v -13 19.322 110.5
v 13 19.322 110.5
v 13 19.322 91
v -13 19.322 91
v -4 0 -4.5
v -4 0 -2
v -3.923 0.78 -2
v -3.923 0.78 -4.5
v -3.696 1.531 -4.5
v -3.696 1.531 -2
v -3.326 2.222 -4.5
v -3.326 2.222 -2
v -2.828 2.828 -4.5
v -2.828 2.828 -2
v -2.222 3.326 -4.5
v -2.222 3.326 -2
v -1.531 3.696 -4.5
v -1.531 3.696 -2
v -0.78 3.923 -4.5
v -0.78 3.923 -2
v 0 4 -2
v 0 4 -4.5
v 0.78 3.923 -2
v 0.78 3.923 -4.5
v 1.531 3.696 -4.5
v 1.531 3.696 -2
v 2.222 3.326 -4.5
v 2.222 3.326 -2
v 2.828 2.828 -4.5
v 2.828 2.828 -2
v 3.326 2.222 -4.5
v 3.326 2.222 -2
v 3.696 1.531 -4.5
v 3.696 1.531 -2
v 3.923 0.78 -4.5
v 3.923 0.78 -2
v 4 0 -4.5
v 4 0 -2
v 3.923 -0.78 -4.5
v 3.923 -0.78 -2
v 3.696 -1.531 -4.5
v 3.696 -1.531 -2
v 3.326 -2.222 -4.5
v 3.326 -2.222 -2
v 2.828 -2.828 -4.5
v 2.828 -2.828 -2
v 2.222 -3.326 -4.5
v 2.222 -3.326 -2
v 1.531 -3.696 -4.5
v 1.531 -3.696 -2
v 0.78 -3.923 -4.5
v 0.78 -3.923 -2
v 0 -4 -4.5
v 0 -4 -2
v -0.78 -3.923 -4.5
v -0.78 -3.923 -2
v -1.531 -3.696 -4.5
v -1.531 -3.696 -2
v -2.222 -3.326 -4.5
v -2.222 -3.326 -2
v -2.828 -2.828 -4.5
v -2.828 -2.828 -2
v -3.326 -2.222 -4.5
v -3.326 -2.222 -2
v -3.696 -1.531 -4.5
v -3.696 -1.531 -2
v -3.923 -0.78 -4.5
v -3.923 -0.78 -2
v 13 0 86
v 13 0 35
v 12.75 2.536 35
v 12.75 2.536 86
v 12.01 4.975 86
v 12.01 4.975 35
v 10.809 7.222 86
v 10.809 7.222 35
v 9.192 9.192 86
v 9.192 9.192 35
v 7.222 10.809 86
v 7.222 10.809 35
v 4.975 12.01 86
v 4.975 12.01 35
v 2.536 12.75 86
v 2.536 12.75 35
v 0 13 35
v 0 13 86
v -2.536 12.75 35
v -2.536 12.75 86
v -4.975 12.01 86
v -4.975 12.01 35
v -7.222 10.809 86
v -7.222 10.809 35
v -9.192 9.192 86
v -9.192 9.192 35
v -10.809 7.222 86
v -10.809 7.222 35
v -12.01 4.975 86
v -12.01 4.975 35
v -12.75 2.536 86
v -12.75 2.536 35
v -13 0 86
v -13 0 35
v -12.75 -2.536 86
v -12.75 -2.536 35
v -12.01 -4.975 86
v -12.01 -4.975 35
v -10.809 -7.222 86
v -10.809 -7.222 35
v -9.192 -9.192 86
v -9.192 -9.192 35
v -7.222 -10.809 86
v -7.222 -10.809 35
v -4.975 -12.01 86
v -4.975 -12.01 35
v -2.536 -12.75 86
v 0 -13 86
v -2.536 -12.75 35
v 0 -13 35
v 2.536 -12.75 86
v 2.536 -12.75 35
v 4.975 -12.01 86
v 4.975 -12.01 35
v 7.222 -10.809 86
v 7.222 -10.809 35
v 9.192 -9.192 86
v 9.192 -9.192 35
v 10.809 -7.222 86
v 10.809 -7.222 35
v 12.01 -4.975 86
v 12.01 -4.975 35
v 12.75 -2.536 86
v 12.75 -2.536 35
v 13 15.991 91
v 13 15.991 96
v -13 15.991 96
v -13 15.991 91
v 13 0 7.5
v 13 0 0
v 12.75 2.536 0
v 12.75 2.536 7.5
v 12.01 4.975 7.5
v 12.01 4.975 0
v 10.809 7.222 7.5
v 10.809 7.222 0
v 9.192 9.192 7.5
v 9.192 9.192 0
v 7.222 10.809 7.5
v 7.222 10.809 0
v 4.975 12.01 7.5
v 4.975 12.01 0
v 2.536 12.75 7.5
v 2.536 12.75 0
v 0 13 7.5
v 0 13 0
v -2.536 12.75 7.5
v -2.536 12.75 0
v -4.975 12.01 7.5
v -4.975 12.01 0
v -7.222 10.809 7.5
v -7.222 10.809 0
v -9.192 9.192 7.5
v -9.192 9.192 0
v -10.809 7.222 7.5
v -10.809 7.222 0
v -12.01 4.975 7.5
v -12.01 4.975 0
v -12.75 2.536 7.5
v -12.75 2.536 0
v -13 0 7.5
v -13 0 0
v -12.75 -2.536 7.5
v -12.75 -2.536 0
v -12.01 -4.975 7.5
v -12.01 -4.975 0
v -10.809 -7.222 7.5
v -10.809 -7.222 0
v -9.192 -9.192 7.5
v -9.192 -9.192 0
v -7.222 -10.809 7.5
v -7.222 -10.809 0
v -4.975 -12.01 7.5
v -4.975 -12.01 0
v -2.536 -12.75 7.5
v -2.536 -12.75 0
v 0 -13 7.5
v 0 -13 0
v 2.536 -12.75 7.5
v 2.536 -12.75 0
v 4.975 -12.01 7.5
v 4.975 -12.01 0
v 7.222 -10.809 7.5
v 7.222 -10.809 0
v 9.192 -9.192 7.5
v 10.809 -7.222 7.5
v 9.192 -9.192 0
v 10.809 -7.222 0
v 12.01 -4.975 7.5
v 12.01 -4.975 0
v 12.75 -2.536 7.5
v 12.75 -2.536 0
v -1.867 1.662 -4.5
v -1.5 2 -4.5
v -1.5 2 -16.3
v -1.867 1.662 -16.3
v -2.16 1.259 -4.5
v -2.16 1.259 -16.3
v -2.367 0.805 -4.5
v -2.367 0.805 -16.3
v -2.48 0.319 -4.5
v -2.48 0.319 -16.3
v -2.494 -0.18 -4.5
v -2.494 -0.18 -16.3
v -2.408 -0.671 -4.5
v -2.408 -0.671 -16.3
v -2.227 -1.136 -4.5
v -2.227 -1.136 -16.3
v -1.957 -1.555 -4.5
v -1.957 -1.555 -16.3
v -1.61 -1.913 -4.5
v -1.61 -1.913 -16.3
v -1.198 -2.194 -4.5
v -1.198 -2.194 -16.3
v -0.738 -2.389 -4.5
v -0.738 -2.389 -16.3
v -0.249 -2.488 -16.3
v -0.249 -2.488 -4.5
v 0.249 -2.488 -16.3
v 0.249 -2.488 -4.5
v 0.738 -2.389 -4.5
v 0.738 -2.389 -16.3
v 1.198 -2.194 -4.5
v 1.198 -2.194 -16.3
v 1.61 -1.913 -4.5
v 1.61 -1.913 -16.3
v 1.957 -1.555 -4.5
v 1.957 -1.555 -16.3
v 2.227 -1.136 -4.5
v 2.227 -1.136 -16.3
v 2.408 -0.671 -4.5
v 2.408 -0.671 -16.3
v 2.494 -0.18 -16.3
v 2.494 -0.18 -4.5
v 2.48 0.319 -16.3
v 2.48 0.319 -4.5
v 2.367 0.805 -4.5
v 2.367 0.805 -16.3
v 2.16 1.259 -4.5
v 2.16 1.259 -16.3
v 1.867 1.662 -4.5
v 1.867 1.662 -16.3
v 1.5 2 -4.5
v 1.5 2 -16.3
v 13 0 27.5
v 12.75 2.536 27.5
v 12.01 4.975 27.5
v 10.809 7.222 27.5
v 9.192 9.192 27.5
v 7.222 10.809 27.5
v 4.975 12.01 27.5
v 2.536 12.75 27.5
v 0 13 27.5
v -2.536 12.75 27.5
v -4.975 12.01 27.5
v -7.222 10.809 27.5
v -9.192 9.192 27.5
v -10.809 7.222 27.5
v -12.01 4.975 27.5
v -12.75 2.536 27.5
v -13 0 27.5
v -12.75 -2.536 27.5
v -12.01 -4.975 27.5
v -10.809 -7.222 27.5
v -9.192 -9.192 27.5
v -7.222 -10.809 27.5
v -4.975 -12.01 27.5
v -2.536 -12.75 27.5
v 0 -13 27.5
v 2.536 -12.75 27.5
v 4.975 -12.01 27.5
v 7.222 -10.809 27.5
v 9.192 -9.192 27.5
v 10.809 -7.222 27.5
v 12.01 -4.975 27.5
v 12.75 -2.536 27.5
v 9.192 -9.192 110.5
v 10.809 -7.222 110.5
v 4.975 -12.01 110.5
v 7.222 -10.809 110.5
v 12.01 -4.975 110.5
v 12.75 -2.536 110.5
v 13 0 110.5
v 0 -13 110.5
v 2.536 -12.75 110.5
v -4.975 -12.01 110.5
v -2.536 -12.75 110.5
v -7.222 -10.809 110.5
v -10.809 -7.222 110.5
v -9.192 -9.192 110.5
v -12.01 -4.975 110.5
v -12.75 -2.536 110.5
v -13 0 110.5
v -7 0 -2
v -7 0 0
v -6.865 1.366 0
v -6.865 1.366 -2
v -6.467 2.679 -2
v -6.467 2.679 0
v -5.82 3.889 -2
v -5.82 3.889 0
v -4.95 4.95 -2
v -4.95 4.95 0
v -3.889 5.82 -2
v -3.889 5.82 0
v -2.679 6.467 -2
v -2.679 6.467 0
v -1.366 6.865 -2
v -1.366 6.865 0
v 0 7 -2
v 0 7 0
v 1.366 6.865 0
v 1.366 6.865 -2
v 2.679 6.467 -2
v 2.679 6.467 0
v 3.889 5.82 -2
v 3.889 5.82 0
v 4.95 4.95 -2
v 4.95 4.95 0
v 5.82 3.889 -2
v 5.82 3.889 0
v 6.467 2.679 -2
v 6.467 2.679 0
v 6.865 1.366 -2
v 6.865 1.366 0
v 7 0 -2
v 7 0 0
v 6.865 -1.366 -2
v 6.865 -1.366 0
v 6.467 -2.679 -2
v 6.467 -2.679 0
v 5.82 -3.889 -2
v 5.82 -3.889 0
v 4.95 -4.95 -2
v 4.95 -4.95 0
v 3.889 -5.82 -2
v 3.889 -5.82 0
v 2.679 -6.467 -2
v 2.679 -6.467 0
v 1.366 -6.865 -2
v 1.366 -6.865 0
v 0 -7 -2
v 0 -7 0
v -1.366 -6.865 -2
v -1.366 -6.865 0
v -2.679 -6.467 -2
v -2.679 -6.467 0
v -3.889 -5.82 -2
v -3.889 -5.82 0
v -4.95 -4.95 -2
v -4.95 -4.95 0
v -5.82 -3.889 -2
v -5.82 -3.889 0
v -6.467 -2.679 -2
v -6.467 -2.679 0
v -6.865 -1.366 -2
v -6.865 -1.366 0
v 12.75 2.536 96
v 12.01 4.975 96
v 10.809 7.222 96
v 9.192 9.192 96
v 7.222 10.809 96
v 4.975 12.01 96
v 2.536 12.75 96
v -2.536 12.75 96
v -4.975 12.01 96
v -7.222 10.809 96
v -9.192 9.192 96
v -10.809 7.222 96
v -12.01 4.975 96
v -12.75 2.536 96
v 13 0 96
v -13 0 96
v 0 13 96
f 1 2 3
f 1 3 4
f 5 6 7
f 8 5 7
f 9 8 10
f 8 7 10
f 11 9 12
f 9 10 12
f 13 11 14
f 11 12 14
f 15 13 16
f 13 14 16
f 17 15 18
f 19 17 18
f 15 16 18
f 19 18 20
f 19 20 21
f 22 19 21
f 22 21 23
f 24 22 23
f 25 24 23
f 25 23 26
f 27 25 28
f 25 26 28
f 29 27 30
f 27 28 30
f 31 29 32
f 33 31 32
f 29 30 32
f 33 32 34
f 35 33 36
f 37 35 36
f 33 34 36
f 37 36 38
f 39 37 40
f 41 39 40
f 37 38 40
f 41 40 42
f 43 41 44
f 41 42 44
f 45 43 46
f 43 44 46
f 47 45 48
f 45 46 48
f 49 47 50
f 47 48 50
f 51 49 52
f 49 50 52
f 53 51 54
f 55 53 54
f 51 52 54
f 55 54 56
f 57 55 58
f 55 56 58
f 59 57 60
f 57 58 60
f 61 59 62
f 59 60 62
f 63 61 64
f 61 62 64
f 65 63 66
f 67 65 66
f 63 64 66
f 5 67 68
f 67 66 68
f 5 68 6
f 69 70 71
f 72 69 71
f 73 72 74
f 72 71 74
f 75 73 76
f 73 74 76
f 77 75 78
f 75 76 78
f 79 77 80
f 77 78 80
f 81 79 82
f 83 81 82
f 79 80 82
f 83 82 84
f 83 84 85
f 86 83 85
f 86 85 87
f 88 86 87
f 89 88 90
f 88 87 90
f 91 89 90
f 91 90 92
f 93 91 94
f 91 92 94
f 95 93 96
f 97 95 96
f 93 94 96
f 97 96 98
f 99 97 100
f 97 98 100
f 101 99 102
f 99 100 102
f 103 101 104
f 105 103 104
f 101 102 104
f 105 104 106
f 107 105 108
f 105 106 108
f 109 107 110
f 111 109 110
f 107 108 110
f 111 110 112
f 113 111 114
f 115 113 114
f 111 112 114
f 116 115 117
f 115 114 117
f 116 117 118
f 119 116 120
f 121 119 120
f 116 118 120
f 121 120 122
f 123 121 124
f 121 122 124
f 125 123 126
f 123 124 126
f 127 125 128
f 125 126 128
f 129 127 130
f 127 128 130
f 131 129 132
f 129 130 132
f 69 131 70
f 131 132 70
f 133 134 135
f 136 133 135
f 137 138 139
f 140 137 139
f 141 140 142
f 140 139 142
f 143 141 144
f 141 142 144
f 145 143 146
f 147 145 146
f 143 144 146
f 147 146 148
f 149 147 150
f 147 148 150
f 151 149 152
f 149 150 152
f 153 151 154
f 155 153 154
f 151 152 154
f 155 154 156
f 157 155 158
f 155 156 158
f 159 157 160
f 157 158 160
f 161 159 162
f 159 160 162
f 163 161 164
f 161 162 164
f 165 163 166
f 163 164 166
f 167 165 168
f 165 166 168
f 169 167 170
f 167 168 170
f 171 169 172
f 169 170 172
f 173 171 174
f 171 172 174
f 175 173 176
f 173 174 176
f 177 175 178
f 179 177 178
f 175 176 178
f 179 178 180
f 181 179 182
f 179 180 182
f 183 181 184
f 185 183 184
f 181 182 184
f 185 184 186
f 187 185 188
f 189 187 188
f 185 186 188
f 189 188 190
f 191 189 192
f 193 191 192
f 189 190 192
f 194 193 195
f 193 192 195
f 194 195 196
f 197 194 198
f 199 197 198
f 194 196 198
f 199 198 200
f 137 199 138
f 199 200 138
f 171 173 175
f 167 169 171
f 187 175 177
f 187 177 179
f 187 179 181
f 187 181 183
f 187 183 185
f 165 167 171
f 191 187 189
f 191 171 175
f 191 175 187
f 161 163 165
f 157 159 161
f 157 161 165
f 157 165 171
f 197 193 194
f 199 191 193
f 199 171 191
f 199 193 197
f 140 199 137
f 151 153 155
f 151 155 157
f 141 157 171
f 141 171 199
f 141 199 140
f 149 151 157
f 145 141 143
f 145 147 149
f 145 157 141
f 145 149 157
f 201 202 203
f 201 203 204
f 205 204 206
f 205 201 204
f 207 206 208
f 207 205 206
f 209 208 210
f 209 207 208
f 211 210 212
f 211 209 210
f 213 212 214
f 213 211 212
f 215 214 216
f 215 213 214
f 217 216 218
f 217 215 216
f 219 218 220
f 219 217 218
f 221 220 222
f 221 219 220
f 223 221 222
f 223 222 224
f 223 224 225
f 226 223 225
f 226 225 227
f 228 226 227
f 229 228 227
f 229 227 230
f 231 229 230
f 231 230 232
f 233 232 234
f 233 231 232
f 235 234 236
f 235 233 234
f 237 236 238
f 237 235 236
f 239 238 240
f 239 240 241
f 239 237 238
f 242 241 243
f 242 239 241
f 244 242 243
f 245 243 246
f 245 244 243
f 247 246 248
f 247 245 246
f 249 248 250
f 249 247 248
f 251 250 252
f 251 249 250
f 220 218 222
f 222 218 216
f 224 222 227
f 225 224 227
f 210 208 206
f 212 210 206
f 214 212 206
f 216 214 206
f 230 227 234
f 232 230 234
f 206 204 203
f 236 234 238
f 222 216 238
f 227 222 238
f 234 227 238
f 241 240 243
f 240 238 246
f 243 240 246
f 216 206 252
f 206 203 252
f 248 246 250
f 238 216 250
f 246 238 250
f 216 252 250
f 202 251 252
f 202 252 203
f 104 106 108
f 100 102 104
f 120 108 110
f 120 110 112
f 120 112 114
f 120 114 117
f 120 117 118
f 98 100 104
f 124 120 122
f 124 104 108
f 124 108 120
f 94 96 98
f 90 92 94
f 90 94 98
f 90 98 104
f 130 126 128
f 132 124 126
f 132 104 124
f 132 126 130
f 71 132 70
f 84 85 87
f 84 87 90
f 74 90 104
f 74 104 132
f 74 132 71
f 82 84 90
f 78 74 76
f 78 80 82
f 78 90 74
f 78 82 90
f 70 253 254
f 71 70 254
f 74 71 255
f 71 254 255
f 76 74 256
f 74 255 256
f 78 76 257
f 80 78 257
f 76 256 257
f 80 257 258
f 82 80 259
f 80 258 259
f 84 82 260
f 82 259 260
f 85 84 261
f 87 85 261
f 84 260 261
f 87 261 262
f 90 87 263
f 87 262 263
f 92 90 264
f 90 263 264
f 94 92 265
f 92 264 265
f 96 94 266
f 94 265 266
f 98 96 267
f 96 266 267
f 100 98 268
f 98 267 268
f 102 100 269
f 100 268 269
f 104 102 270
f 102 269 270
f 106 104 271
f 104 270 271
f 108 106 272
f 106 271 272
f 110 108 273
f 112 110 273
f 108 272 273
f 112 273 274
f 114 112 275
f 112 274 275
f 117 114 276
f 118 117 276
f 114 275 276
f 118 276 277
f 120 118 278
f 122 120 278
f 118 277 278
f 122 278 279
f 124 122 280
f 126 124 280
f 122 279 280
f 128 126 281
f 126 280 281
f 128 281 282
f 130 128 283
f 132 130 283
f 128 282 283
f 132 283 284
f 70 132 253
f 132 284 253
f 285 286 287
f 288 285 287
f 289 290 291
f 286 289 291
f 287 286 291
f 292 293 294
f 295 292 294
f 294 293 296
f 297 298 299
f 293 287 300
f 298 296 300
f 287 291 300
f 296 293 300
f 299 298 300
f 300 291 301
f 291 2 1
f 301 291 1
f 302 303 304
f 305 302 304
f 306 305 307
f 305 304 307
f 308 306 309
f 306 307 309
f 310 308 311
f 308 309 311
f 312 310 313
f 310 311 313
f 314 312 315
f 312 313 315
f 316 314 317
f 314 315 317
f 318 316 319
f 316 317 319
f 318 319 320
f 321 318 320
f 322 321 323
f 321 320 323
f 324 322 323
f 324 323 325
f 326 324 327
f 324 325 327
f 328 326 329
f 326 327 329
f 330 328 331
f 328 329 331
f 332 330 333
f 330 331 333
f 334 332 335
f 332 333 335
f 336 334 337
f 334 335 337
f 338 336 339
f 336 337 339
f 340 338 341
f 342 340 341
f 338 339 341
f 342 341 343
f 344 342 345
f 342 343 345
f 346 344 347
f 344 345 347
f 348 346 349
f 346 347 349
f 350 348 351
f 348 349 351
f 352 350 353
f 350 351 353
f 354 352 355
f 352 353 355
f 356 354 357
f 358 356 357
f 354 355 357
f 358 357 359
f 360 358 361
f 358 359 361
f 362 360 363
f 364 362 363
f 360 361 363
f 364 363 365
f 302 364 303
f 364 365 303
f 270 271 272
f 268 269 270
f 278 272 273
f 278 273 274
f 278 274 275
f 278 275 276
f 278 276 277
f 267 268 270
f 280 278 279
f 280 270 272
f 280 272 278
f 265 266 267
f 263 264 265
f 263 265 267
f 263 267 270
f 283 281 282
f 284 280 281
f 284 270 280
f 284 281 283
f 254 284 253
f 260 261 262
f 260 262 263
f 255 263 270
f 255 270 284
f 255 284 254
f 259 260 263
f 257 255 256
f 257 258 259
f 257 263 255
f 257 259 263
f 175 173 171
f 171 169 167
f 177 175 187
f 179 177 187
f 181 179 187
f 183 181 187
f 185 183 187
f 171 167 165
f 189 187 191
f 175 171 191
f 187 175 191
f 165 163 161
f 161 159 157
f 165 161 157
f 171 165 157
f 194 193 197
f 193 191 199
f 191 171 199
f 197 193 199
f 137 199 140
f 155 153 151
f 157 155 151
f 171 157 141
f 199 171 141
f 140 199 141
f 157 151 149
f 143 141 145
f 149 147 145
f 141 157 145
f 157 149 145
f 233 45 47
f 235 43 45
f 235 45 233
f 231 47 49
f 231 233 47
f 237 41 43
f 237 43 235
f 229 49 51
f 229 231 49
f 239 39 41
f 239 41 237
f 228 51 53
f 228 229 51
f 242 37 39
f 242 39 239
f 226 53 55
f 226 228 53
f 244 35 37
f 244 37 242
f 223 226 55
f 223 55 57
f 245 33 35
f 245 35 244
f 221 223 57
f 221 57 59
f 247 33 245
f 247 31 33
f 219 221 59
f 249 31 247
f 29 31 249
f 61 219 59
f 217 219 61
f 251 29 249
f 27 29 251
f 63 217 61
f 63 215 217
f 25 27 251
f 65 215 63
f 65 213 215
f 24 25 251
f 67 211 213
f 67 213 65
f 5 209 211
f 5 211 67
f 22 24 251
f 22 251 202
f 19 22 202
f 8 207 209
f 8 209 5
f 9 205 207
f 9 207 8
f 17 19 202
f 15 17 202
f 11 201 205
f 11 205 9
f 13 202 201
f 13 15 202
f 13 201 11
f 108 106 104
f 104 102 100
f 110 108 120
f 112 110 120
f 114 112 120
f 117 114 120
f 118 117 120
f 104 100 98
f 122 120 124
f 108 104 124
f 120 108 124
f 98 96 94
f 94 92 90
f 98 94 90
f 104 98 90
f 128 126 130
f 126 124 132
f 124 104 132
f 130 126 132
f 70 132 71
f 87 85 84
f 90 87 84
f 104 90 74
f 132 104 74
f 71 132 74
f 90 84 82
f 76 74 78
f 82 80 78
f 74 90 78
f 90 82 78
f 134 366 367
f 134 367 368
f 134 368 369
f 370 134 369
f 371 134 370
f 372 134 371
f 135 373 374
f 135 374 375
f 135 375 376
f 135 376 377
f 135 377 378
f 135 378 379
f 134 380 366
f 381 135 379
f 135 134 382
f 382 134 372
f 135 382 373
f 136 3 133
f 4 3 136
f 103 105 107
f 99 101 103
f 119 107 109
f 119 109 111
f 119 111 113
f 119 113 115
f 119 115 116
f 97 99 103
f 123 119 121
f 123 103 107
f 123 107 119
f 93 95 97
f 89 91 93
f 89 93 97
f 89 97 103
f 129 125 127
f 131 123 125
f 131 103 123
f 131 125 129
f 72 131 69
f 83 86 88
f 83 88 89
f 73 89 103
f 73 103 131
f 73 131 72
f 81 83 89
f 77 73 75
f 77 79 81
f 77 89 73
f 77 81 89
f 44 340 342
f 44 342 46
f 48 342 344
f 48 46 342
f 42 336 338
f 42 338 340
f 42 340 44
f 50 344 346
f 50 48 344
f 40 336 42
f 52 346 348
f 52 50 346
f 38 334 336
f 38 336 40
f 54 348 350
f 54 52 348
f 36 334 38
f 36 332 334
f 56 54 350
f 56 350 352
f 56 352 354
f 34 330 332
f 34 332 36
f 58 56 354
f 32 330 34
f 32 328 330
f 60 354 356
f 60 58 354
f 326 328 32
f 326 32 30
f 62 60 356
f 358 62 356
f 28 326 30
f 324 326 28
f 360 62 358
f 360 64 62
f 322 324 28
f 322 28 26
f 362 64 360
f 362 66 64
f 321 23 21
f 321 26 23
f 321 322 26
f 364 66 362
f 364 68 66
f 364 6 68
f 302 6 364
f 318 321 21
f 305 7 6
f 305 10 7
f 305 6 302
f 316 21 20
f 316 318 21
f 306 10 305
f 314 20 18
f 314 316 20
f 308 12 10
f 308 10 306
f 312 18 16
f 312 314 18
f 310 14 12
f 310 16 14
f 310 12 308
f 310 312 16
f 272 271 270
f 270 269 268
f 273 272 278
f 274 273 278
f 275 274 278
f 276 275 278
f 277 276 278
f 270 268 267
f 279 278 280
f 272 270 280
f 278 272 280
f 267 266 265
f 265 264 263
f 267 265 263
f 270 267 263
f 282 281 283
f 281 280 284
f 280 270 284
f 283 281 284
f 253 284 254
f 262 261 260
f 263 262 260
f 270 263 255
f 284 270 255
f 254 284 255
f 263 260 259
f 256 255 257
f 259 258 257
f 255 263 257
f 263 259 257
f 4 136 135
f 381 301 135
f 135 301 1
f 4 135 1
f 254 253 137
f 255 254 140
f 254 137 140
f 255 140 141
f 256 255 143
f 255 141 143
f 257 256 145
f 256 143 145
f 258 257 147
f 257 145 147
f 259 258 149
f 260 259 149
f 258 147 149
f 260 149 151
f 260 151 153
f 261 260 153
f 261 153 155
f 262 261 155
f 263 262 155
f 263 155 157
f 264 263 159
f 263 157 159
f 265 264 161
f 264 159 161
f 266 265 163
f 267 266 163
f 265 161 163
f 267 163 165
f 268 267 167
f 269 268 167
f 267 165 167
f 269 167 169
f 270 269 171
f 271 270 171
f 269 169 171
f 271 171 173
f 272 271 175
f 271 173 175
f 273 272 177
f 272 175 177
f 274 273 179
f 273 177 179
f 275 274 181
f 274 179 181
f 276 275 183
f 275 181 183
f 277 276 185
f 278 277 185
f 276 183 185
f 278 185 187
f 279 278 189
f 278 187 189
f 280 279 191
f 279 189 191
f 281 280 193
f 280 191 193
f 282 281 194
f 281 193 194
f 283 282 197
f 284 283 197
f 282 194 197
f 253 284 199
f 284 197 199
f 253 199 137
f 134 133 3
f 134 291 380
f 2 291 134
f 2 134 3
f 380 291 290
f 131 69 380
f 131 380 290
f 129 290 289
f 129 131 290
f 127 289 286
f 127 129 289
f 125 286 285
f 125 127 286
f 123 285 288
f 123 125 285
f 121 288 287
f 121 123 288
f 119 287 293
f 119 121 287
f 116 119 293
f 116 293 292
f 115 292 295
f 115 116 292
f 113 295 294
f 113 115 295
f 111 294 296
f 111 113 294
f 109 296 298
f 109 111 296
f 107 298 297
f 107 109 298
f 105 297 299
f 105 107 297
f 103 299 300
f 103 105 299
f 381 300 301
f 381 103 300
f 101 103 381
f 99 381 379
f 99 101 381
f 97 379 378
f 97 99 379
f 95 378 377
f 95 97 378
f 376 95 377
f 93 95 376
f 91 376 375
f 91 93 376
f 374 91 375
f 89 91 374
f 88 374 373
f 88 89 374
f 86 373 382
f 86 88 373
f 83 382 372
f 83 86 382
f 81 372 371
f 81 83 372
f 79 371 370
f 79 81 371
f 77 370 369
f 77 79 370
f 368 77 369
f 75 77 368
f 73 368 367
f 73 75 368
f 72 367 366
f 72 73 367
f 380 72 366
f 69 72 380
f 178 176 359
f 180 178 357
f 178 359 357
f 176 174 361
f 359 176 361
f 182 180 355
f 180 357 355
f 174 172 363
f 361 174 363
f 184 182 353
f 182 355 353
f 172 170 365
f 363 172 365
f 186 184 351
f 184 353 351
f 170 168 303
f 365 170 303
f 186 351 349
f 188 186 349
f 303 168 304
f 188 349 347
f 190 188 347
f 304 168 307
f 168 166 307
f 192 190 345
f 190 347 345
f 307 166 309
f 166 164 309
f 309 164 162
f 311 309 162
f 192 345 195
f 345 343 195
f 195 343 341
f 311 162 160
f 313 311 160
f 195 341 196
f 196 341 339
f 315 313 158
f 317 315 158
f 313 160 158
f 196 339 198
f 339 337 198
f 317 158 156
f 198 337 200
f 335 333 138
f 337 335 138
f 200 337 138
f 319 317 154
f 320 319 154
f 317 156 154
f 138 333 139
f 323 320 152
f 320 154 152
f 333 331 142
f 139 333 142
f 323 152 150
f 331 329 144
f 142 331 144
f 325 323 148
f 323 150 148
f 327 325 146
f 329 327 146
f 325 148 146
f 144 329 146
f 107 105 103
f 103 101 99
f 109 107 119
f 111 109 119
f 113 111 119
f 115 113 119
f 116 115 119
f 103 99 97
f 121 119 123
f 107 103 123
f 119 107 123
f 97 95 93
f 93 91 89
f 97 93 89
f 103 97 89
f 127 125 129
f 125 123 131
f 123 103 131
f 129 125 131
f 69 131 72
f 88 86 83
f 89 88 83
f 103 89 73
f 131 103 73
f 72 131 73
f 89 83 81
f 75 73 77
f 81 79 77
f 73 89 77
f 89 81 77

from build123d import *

# Parameters (mm, degrees)
ESQUISSE1_R         = 13
BOSS_EXTRU_1_DEPTH  = 7.5
ESQUISSE2_R         = 13
BOSS_EXTRU_2_DEPTH  = 20
ESQUISSE3_R         = 13
BOSS_EXTRU_3_DEPTH  = 7.5
ESQUISSE4_R         = 13
BOSS_EXTRU_4_DEPTH  = 51
ESQUISSE5_R         = 13
BOSS_EXTRU_5_DEPTH  = 10
BOSS_EXTRU_6_DEPTH  = 14.5
ESQUISSE7_W         = 26
ESQUISSE7_H         = 3.33041152
BOSS_EXTRU_7_DEPTH  = 5
ESQUISSE10_R        = 7
BOSS_EXTRU_8_DEPTH  = 2
ESQUISSE11_R        = 4
BOSS_EXTRU_9_DEPTH  = 2.5
BOSS_EXTRU_10_DEPTH = 11.8


with BuildPart() as part:
    # Esquisse1 → Boss.-Extru.1 (new body)
    with BuildSketch(Plane.XY):
        Circle(ESQUISSE1_R)
    extrude(amount=BOSS_EXTRU_1_DEPTH)

    # Esquisse10 → Boss.-Extru.8 (add)
    with BuildSketch(Plane(origin=(0, 0, 0), x_dir=(-1, 0, 0), z_dir=(0, 0, -1))):
        Circle(ESQUISSE10_R)
    extrude(amount=BOSS_EXTRU_8_DEPTH)

    # Esquisse11 → Boss.-Extru.9 (add)
    with BuildSketch(Plane(origin=(0, 0, -2), x_dir=(-1, 0, 0), z_dir=(0, 0, -1))):
        Circle(ESQUISSE11_R)
    extrude(amount=BOSS_EXTRU_9_DEPTH)

    # Esquisse12 → Boss.-Extru.10 (add)
    with BuildSketch(Plane(origin=(0, 0, -4.5), x_dir=(-1, 0, 0), z_dir=(0, 0, -1))):
        with BuildLine():
            Line((-1.5, 2), (1.5, 2))
            ThreePointArc((1.5, 2), (0, -2.5), (-1.5, 2))
        make_face()
    extrude(amount=BOSS_EXTRU_10_DEPTH)


with BuildPart() as body_2:
    # Esquisse2 → Boss.-Extru.2 (new body)
    with BuildSketch(Plane.XY.offset(7.5)):
        Circle(ESQUISSE2_R)
    extrude(amount=BOSS_EXTRU_2_DEPTH)


with BuildPart() as body_3:
    # Esquisse3 → Boss.-Extru.3 (new body)
    with BuildSketch(Plane.XY.offset(27.5)):
        Circle(ESQUISSE3_R)
    extrude(amount=BOSS_EXTRU_3_DEPTH)


with BuildPart() as body_4:
    # Esquisse4 → Boss.-Extru.4 (new body)
    with BuildSketch(Plane.XY.offset(35)):
        Circle(ESQUISSE4_R)
    extrude(amount=BOSS_EXTRU_4_DEPTH)


with BuildPart() as body_5:
    # Esquisse5 → Boss.-Extru.5 (new body)
    with BuildSketch(Plane.XY.offset(86)):
        Circle(ESQUISSE5_R)
    extrude(amount=BOSS_EXTRU_5_DEPTH)

    # Esquisse6 → Boss.-Extru.6 (add)
    with BuildSketch(Plane.XY.offset(96)):
        with BuildLine():
            Line((-13, 0), (-13, 19.321523154))
            Line((-13, 19.321523154), (13, 19.321523154))
            Line((13, 19.321523154), (13, 0))
            ThreePointArc((13, 0), (0, -13), (-13, 0))
        make_face()
    extrude(amount=BOSS_EXTRU_6_DEPTH)

    # Esquisse7 → Boss.-Extru.7 (add)
    with BuildSketch(Plane(origin=(0, 0, 96), x_dir=(-1, 0, 0), z_dir=(0, 0, -1))):
        with Locations((0, 17.656317394)):
            Rectangle(ESQUISSE7_W, ESQUISSE7_H)
    extrude(amount=BOSS_EXTRU_7_DEPTH)


solid = Compound([part.part, body_2.part, body_3.part, body_4.part, body_5.part])
